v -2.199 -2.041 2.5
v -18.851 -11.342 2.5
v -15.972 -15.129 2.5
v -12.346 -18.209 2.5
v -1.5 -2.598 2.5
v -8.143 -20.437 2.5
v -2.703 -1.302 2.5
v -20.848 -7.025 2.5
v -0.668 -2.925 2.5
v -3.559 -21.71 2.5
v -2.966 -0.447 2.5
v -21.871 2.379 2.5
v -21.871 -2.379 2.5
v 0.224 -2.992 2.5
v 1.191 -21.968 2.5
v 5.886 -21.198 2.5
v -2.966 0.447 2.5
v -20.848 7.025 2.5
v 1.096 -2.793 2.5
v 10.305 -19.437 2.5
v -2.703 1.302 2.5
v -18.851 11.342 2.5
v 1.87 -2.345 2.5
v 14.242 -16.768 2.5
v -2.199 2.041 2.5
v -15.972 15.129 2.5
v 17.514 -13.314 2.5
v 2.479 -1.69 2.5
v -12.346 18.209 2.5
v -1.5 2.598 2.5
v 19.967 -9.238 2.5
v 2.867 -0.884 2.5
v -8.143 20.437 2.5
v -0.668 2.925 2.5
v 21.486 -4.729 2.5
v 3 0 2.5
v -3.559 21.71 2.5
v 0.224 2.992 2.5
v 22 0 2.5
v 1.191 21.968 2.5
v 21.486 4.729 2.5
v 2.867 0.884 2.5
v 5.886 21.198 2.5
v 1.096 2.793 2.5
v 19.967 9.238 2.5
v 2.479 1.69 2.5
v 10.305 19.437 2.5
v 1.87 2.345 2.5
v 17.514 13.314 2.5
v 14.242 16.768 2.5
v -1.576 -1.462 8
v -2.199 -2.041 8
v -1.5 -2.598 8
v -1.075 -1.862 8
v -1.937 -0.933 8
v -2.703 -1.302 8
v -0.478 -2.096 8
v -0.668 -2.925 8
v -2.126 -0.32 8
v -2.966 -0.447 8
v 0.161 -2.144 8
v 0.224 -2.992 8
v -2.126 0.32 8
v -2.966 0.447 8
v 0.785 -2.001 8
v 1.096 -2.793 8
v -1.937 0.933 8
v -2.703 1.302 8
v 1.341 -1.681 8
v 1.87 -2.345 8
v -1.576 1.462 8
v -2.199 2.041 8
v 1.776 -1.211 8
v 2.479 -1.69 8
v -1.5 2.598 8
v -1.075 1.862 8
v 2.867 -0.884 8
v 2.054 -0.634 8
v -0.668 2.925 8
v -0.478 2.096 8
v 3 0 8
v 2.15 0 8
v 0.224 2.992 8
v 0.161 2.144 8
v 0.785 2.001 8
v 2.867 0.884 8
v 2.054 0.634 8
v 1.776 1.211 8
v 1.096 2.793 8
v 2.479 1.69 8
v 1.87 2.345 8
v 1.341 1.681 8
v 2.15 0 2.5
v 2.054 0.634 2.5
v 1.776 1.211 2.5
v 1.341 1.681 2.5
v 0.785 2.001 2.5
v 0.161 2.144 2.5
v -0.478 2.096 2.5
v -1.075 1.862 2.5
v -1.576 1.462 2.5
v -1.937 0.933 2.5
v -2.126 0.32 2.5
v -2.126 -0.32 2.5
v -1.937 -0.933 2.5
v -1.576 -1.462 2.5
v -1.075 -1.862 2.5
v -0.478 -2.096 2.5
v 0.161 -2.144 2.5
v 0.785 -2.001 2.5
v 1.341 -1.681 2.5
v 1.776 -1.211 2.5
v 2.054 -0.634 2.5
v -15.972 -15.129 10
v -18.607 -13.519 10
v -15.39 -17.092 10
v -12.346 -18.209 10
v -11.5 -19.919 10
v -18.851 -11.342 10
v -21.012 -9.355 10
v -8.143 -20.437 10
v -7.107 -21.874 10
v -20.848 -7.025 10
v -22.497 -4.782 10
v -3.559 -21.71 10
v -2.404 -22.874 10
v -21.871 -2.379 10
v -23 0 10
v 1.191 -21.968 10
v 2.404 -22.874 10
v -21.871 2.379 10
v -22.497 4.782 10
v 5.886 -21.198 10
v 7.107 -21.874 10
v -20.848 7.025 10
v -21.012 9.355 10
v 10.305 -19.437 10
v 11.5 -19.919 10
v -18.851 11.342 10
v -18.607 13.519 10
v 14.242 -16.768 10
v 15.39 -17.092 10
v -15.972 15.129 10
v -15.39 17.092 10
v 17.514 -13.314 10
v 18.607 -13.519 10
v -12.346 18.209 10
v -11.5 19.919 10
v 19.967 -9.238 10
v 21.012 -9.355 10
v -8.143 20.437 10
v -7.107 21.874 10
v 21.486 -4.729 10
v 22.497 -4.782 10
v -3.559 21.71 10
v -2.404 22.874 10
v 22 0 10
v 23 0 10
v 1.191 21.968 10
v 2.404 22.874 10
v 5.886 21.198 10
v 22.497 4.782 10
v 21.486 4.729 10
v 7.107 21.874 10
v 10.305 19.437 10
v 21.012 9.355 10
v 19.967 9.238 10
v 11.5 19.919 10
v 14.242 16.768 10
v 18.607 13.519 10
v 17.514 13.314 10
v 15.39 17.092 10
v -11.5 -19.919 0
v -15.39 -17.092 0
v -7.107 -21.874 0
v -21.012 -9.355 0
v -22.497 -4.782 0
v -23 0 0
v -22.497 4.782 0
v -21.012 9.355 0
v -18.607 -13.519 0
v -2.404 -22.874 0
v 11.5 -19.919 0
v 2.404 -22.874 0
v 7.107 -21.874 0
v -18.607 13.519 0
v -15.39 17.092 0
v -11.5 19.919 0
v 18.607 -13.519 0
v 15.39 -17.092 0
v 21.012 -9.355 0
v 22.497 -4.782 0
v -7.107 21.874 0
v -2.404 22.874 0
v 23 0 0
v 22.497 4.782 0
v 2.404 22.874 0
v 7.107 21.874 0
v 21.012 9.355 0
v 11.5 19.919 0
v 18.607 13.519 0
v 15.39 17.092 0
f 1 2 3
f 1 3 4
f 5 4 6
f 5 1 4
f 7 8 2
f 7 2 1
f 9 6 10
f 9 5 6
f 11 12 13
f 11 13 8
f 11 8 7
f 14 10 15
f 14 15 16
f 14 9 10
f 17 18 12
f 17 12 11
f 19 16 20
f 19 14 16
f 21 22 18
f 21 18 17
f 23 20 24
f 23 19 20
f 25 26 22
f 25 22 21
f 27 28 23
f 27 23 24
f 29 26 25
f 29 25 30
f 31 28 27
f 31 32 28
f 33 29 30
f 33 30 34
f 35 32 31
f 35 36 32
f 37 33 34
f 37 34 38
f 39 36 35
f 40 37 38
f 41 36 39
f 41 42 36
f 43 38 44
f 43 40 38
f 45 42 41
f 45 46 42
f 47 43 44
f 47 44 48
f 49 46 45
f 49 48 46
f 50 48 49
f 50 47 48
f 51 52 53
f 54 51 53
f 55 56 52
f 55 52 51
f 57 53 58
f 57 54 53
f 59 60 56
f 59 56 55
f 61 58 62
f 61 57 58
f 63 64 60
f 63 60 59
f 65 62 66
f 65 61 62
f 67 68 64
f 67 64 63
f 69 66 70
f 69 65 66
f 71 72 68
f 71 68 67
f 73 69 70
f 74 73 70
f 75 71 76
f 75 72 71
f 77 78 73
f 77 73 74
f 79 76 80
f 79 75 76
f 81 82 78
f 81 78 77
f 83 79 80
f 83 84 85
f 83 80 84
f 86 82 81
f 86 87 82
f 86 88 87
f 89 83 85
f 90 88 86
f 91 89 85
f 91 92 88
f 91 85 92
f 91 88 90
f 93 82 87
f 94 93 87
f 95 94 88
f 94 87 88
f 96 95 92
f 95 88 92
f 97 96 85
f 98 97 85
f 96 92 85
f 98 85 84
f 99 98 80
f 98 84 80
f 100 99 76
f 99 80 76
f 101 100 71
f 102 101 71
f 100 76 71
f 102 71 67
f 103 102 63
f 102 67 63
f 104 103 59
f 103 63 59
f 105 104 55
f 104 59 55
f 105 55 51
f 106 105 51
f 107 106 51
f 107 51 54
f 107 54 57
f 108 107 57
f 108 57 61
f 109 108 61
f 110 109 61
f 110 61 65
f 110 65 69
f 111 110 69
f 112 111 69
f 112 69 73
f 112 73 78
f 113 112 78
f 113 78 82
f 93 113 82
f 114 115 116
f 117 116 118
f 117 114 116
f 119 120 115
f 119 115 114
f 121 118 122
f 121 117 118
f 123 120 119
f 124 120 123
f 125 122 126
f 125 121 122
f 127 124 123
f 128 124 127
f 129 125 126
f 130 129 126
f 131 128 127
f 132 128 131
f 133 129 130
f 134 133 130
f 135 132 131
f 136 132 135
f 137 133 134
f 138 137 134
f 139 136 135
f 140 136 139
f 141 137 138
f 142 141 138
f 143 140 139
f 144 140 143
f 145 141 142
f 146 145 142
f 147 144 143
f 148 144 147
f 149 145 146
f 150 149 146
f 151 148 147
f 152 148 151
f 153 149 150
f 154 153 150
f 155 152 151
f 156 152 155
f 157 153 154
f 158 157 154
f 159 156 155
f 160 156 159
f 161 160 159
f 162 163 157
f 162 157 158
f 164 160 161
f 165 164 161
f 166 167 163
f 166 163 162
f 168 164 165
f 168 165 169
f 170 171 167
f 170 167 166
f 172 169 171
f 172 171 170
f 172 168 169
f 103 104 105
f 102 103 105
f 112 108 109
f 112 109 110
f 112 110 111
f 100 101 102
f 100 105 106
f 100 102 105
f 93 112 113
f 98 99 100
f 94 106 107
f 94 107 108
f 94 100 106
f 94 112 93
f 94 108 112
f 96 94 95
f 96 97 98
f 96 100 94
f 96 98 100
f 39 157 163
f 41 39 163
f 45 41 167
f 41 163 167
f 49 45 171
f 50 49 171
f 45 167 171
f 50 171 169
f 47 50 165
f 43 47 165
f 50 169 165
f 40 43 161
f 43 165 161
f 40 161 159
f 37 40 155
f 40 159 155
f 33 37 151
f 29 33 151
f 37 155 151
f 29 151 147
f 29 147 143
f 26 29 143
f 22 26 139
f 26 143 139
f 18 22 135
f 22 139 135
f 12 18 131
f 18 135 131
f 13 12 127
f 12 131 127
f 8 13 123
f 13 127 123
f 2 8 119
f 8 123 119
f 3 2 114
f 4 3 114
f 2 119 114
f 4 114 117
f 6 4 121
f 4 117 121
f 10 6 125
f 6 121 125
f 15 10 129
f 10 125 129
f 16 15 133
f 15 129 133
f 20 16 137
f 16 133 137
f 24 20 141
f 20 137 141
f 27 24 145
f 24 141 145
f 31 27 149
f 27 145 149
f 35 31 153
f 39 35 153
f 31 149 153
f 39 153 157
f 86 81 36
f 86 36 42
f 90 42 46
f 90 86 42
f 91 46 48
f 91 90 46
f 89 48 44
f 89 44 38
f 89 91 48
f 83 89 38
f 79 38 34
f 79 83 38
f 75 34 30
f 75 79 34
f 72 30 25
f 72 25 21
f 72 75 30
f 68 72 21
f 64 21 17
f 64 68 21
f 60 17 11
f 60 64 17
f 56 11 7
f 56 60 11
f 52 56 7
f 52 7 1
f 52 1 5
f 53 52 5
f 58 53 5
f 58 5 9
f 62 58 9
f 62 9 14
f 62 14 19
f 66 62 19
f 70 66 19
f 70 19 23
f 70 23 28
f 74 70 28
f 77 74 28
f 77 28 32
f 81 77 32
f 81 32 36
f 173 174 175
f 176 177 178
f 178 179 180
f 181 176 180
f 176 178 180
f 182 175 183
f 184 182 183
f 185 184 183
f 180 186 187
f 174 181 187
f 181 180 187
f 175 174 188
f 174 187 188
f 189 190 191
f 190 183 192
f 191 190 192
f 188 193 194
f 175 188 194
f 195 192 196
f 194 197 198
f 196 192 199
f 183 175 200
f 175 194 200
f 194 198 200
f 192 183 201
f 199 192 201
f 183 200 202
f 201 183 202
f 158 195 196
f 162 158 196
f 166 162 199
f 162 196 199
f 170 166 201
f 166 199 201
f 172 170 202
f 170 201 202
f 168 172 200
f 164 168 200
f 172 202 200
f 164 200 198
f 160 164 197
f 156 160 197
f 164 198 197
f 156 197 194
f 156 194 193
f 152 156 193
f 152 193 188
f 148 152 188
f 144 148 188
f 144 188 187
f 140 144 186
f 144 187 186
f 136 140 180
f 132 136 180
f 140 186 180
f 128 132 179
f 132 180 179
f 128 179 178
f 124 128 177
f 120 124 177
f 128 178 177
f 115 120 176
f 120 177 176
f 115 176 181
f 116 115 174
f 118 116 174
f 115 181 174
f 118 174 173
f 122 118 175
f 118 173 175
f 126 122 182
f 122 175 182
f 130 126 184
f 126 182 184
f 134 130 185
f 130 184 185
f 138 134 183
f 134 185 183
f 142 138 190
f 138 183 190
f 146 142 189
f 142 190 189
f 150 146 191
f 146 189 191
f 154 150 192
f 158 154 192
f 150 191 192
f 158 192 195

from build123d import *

# Parameters (mm, degrees)
F0_R     = 23
F1_DEPTH = 10
F2_R     = 22
F2_R_2   = 3
F2_R_3   = 2.15
F3_DEPTH = 7.5
F4_DEPTH = 2


with BuildPart() as f1:
    # F0 (on Top) → F1 (new body)
    with BuildSketch(Plane.XY):
        Circle(F0_R)
    extrude(amount=F1_DEPTH)

    # F2 (on face) → F3 (cut)
    with BuildSketch(Plane.XY.offset(10)):
        Circle(F2_R)
        Circle(F2_R_2, mode=Mode.SUBTRACT)
        Circle(F2_R_3)
    extrude(amount=-F3_DEPTH, mode=Mode.SUBTRACT)

    # F4 (cut): a face of the model
    f4_faces = [f1.faces().sort_by_distance(p)[0] for p in [
        (-2.9151471863, 0, 10),
    ]]
    extrude(f4_faces, amount=-F4_DEPTH, mode=Mode.SUBTRACT)


solid = f1.part
